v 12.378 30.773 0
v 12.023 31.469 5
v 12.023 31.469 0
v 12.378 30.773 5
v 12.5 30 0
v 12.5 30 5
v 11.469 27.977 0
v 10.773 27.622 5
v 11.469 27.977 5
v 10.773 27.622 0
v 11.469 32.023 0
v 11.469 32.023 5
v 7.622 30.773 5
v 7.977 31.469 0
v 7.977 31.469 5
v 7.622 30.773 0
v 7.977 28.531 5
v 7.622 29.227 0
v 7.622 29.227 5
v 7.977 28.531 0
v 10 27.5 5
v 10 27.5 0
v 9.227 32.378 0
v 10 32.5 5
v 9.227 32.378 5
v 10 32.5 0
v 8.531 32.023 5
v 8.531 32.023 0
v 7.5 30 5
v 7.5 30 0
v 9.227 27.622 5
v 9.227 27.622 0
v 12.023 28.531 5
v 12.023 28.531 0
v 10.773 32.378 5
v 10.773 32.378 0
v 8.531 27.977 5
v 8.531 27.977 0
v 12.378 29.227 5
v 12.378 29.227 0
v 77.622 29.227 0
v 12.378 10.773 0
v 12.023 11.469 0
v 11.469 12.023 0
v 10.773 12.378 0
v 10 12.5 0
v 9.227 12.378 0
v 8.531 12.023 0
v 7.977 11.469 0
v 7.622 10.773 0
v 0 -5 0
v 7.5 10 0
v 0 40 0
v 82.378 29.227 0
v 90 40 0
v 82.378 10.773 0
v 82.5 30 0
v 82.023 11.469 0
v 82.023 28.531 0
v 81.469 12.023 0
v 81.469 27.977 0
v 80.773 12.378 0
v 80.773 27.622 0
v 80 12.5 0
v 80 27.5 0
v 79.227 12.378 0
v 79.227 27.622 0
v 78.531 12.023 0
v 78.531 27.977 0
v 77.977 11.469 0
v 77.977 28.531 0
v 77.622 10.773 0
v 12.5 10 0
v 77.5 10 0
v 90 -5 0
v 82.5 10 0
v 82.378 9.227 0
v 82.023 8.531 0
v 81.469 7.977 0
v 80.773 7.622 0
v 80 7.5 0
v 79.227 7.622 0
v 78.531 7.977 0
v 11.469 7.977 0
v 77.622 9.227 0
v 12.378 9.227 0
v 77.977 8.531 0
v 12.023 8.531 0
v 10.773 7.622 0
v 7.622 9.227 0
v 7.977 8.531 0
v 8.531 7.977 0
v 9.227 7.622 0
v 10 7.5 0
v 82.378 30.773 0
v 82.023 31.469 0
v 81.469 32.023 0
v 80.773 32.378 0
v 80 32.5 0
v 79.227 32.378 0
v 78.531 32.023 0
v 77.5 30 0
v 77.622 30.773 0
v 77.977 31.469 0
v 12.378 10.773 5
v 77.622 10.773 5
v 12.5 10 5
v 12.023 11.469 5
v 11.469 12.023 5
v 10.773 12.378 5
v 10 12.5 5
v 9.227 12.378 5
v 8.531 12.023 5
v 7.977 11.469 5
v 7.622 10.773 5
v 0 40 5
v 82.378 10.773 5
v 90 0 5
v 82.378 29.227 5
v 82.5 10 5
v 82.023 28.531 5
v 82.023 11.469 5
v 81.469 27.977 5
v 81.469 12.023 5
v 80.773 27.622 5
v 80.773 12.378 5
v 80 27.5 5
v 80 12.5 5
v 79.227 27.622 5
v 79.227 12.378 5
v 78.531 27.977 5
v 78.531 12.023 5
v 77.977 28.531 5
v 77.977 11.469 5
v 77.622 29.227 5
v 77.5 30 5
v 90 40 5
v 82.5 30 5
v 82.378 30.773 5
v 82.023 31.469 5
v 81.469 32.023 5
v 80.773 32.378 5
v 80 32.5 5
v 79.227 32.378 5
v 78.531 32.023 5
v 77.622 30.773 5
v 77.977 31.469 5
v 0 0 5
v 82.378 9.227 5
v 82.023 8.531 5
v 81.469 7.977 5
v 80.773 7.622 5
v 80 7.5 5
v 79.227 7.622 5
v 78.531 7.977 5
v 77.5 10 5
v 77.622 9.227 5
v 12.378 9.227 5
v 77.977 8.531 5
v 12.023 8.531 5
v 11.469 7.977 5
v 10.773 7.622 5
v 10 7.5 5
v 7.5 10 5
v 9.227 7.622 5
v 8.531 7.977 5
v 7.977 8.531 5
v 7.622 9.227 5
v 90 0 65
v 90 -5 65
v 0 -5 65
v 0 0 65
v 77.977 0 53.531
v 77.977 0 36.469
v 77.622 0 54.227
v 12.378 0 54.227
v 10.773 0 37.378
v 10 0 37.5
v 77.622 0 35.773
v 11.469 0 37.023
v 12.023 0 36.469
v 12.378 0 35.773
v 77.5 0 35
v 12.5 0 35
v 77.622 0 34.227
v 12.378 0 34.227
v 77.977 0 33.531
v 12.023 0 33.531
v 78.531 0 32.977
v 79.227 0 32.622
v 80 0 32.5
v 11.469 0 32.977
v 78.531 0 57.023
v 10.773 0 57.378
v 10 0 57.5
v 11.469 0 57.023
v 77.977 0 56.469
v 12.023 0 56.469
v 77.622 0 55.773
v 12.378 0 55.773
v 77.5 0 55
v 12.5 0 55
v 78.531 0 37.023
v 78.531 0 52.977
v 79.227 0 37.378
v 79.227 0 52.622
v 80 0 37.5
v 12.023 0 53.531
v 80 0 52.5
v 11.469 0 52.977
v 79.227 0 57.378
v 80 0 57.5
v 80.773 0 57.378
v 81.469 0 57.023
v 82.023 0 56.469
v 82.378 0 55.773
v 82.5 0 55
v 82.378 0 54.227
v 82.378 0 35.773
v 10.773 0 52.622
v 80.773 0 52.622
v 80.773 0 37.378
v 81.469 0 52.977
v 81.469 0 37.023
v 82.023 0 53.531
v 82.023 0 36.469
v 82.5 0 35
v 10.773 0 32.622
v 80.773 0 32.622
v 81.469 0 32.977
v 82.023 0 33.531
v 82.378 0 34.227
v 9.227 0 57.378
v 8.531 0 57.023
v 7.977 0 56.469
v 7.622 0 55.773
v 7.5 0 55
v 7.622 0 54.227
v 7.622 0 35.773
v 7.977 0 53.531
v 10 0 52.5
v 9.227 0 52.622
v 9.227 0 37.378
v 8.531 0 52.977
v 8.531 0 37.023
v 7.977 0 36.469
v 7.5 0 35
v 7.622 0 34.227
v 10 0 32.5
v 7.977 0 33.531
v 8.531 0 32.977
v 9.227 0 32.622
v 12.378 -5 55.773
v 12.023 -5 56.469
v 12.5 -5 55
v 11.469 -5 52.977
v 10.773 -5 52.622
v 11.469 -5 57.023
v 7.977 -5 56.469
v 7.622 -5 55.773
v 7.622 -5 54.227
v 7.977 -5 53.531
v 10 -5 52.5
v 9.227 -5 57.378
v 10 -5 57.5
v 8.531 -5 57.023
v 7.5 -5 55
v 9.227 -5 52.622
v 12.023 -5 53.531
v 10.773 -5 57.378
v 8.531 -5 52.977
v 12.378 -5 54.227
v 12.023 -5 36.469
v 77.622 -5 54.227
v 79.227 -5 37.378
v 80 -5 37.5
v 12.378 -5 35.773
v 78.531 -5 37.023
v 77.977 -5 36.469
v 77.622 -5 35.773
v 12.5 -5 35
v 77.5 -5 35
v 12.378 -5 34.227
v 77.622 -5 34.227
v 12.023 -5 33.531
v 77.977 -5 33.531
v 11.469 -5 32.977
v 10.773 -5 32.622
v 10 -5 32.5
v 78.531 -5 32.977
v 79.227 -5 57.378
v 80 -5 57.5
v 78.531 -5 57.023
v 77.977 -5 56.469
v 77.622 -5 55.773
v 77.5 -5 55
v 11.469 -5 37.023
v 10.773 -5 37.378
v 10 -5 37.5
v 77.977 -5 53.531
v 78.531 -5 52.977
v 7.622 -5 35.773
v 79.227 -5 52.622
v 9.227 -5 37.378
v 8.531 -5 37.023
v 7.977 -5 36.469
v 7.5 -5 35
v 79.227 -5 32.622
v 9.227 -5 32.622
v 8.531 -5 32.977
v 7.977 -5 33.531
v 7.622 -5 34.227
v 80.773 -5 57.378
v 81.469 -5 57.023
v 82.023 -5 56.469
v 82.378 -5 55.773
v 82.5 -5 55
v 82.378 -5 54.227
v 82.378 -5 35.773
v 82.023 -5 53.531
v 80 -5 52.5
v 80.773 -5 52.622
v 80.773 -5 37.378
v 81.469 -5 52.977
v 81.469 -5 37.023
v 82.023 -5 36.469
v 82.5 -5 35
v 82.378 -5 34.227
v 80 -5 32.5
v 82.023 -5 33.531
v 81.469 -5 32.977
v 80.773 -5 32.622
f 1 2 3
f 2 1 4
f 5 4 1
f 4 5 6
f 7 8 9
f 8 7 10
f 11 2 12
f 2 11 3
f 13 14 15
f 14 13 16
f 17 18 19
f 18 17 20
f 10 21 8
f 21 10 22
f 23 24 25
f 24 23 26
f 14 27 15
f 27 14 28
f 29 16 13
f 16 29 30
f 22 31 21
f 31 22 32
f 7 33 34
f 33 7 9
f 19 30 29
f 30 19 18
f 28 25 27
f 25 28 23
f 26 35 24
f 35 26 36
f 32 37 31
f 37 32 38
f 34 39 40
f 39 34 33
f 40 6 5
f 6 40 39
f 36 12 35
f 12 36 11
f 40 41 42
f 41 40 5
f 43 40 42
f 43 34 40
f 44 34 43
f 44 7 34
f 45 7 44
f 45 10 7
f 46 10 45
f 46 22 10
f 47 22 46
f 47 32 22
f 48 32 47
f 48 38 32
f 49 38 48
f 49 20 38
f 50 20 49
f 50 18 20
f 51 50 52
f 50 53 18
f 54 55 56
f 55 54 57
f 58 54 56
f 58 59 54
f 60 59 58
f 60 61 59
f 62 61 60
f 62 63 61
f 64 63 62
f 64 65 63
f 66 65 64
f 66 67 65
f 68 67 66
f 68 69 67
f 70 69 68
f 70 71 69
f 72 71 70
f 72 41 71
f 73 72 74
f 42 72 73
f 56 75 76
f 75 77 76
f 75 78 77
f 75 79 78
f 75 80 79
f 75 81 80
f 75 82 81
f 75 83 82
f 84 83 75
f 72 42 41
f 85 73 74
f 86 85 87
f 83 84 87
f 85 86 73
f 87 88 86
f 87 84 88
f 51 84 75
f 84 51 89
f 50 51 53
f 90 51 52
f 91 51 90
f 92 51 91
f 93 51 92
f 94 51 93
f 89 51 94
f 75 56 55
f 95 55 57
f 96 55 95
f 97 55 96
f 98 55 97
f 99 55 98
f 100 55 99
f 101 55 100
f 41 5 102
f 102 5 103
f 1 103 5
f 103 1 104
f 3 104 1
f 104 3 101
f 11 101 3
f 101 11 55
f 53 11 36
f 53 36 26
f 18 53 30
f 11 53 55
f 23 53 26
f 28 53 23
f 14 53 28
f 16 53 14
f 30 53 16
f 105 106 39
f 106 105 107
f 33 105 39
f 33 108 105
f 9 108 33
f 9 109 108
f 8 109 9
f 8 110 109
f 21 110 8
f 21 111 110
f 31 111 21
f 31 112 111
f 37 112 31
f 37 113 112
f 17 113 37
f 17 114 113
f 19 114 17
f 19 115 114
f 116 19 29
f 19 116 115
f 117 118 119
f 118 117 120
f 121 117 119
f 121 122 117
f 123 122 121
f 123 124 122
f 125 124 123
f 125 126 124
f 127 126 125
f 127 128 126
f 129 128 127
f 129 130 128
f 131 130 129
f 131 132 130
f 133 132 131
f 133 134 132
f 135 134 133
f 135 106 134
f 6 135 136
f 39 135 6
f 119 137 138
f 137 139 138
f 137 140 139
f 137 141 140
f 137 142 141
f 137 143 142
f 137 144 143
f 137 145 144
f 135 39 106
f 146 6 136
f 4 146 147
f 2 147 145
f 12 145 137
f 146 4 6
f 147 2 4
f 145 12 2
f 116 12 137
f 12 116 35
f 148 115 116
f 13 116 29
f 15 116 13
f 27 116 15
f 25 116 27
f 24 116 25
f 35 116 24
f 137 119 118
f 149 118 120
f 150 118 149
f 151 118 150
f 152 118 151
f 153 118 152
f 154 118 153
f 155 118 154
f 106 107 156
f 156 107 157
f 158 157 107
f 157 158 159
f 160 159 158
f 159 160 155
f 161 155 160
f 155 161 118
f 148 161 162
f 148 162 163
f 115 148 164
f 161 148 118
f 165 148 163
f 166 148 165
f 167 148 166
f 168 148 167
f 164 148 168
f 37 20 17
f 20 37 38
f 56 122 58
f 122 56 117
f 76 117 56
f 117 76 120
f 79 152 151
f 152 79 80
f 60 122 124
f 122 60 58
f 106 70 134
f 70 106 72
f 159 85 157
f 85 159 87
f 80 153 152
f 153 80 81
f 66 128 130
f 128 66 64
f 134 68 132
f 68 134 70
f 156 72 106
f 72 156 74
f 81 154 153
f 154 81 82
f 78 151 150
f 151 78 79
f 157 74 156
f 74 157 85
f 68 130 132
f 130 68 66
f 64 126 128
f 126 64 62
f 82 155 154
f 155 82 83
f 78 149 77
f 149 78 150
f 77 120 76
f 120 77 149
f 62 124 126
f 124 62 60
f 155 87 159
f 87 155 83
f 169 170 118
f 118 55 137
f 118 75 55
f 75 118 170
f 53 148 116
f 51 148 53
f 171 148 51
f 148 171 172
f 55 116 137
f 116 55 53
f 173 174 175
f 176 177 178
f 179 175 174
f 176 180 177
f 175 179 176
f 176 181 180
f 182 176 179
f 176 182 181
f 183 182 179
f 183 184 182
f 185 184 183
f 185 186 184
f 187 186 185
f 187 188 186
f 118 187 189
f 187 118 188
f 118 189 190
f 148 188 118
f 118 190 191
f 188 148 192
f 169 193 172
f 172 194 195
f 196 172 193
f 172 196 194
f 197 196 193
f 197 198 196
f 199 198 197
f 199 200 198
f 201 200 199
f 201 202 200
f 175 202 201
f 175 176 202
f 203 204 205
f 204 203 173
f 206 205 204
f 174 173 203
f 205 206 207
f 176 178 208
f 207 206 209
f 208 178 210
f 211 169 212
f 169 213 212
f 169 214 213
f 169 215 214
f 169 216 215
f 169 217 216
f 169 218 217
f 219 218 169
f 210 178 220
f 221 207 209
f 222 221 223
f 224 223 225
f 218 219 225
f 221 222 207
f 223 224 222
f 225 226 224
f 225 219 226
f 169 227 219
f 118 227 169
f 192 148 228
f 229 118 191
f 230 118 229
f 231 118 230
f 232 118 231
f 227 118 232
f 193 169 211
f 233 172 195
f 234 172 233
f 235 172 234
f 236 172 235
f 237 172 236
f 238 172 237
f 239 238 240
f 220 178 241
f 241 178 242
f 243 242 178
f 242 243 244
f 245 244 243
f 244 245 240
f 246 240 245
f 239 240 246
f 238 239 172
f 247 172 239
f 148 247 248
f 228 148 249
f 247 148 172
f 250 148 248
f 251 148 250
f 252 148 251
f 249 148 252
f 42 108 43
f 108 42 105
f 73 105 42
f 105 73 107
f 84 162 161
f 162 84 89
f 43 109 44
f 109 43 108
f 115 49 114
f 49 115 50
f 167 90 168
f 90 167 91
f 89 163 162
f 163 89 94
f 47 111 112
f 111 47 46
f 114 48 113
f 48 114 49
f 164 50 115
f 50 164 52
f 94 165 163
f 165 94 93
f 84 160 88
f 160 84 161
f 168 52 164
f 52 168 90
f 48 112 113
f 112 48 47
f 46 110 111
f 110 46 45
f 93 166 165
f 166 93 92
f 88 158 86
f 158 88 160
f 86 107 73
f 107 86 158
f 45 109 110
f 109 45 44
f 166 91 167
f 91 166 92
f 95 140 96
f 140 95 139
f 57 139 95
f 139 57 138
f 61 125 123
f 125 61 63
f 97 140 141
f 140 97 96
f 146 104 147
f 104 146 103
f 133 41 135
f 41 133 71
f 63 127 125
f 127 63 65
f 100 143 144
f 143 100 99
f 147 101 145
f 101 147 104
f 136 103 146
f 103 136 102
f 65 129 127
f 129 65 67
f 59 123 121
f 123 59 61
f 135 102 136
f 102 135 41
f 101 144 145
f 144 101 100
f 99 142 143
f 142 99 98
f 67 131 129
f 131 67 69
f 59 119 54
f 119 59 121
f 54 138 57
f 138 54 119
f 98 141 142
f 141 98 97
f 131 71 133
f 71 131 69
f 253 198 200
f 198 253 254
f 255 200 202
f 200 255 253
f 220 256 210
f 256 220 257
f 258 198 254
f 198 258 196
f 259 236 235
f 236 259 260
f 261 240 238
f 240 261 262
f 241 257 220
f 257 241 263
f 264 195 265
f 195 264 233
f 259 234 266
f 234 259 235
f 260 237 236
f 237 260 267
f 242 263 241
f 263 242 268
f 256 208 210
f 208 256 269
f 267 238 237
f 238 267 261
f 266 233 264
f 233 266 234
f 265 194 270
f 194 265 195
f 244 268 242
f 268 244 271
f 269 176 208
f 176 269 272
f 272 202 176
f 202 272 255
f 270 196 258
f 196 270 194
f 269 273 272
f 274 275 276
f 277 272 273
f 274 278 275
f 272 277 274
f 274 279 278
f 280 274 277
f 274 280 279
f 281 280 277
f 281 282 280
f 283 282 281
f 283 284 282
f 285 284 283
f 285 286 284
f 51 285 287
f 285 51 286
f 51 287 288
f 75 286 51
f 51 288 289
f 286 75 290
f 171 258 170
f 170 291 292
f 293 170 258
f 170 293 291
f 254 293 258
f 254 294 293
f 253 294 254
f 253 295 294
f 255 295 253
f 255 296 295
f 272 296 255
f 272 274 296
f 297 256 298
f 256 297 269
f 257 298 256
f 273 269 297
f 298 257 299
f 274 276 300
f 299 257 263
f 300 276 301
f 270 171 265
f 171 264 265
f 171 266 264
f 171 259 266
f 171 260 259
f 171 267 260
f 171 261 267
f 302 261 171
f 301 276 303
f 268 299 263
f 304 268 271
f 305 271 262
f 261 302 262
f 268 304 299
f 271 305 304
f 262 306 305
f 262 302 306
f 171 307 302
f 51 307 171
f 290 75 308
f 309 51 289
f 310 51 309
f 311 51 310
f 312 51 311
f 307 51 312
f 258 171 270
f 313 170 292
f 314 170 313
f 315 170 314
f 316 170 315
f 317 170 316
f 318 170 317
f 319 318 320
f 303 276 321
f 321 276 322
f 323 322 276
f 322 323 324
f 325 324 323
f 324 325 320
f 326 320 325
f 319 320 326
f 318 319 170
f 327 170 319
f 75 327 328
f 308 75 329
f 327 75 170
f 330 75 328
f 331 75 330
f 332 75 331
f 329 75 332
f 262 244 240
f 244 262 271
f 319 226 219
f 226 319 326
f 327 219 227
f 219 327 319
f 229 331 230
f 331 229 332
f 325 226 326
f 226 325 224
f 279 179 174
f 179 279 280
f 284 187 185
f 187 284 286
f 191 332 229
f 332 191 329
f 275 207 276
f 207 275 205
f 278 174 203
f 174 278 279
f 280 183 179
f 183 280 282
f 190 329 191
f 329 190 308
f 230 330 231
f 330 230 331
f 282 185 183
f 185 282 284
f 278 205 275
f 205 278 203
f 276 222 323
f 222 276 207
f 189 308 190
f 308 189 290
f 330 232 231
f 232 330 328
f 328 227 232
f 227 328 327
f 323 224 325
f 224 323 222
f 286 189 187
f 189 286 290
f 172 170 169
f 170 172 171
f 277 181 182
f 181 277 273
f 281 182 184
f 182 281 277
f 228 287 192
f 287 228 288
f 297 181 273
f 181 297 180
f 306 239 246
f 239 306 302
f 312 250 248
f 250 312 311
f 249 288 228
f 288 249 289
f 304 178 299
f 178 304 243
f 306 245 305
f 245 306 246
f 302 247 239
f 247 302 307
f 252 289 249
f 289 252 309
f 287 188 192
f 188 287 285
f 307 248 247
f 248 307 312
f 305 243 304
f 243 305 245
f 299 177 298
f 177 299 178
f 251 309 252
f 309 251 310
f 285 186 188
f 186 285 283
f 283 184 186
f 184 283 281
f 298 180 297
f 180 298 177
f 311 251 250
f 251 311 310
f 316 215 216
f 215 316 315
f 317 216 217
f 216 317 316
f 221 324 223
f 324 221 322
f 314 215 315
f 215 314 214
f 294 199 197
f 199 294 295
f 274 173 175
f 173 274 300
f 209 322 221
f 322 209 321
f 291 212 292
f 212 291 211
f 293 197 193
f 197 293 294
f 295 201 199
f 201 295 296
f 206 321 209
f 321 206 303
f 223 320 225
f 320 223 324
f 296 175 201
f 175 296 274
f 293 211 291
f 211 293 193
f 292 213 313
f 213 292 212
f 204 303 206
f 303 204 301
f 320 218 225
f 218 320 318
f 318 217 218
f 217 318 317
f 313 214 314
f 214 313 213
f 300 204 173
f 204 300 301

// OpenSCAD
height = 90;
width = 40;
thickness = 5;

alu_x = 20;

bolt = 5;

hole_offset = alu_x/2;

union()
	{
		difference()
		{
			cube([height,width,thickness]);

			translate([hole_offset,width/4,0]) 
				cylinder(h=thickness,r=bolt/2, $fn=20);

			translate([height-hole_offset,3*width/4,0]) 
				cylinder(h=thickness,r=bolt/2, $fn=20);
		
			if (height == 90)
			{
				translate([hole_offset,3*width/4,0]) 
					cylinder(h=thickness,r=bolt/2, $fn=20);

				translate([height-hole_offset,width/4,0]) 
					cylinder(h=thickness,r=bolt/2, $fn=20);

			}
		}

		rotate(90,[1,0,0]) 
		difference()
		{
			cube([height,width+alu_x+thickness,thickness]);

			translate([hole_offset,width/4+alu_x+thickness,0])
				cylinder(h=thickness,r=bolt/2, $fn=20);

			translate([height-hole_offset,3*width/4+alu_x+thickness,0])
				cylinder(h=thickness,r=bolt/2, $fn=20);

			if (height == 90)
			{
				translate([hole_offset,3*width/4+alu_x+thickness,0])
					cylinder(h=thickness,r=bolt/2, $fn=20);

				translate([height-hole_offset,width/4+alu_x+thickness,0])
					cylinder(h=thickness,r=bolt/2, $fn=20);

			}
		}
	}
